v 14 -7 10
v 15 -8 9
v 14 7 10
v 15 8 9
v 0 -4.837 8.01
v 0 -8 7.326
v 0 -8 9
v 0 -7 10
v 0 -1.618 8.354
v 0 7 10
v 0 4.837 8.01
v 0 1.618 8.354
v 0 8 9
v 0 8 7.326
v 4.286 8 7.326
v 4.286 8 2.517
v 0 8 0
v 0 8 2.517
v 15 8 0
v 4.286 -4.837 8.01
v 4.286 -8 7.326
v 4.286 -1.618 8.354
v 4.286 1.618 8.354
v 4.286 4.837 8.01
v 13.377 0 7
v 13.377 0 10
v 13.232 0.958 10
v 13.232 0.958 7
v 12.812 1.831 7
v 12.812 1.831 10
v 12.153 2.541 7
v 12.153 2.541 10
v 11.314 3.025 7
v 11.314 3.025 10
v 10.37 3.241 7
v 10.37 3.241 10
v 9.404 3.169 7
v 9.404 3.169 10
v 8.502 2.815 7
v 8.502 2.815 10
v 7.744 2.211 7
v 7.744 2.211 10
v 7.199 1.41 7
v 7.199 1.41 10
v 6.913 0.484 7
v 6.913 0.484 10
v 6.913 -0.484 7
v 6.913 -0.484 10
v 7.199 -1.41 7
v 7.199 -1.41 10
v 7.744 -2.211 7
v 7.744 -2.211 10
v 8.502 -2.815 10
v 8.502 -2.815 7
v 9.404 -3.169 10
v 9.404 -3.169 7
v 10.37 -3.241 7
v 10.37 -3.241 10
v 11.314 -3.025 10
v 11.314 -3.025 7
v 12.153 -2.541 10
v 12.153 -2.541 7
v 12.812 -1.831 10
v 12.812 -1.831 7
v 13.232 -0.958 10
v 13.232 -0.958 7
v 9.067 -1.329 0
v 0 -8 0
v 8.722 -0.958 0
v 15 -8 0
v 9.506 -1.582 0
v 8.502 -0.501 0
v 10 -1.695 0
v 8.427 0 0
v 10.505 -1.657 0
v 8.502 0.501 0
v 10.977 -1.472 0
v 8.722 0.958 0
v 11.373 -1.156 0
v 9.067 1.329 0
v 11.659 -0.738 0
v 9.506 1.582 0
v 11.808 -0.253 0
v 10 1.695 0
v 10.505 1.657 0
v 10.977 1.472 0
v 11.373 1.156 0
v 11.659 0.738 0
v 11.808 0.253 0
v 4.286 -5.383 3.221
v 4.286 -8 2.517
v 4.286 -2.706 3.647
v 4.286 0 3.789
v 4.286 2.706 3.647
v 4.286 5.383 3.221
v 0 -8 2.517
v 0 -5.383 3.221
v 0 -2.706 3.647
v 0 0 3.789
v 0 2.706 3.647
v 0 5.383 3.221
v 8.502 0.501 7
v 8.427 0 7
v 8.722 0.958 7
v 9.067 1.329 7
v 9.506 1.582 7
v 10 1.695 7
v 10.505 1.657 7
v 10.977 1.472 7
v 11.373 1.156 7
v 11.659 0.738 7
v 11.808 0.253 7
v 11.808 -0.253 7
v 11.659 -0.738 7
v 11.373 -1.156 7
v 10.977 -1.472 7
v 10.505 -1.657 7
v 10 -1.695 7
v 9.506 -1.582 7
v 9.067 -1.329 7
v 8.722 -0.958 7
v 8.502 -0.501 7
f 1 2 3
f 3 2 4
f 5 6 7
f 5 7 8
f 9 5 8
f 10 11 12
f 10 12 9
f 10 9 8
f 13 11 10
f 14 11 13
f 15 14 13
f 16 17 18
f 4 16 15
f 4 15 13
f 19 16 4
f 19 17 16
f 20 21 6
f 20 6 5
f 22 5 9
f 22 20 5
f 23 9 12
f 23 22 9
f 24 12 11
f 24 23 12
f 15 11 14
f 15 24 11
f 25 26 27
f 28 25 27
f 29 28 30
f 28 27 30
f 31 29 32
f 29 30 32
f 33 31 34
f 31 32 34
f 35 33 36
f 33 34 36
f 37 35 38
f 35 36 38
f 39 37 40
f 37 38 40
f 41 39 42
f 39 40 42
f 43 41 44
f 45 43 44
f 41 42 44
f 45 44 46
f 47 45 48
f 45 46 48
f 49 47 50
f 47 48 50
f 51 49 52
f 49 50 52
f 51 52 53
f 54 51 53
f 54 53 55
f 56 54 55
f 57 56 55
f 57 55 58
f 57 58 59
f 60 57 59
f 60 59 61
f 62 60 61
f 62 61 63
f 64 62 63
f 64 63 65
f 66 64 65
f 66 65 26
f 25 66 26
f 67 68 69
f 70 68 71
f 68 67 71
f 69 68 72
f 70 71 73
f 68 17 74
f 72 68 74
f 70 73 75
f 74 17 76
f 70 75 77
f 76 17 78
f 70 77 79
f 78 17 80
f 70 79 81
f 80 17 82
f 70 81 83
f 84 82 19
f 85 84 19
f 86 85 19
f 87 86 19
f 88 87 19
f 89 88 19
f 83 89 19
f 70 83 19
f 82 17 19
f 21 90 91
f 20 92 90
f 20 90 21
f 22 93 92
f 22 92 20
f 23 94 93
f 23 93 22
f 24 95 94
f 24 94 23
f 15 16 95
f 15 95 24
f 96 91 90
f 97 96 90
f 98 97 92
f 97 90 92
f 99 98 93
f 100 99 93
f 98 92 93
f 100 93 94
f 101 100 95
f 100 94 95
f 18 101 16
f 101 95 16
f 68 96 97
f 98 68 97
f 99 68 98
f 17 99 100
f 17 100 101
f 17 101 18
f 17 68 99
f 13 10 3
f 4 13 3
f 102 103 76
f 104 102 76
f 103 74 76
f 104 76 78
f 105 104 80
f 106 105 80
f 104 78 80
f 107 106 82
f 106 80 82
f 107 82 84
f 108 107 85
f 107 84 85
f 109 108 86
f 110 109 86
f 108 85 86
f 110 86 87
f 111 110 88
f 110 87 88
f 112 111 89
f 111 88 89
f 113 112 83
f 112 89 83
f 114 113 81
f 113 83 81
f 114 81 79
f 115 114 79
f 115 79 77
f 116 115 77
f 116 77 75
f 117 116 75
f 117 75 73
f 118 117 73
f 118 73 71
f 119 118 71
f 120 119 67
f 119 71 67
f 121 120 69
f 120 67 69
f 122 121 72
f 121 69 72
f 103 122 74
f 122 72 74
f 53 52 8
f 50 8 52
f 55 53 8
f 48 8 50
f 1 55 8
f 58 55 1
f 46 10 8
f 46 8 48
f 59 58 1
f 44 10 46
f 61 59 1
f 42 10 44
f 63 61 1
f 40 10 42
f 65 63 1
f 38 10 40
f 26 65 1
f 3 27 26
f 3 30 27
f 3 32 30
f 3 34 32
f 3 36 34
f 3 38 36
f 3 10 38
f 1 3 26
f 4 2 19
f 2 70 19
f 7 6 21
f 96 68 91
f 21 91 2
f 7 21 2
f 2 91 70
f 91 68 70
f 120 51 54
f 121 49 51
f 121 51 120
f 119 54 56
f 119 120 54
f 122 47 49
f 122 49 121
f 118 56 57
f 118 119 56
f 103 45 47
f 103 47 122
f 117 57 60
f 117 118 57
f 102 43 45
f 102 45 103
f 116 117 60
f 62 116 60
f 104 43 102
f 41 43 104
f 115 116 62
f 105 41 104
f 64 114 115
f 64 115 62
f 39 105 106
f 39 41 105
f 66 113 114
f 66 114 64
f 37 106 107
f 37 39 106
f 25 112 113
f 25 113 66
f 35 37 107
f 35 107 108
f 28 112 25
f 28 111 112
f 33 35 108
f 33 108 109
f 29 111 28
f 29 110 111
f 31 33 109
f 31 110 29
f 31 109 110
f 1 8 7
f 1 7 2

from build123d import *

# Parameters (mm, degrees)
ESQUISSE1_W                                        = 15
ESQUISSE1_H                                        = 16
EXTRUSION1_DEPTH                                   = 10
CHANFREIN1_SIZE                                    = 1
CHAMBRAGE_POUR_VIS_T_TE_HEXAGONALE_M31_D           = 3.4
CHAMBRAGE_POUR_VIS_T_TE_HEXAGONALE_M31_CBORE_D     = 6.5
CHAMBRAGE_POUR_VIS_T_TE_HEXAGONALE_M31_CBORE_DEPTH = 3
ESQUISSE2_W                                        = 5.5288305
ESQUISSE2_H                                        = 4.608549318
ENL_VEMENT_DE_MATI_RE_R_VOLUTION1_ANGLE            = 39
CHANFREIN2_SIZE                                    = 1


with BuildPart() as part:
    # Esquisse1 → Extrusion1 (new body)
    with BuildSketch(Plane.XY):
        with Locations((7.5, 0)):
            Rectangle(ESQUISSE1_W, ESQUISSE1_H)
    extrude(amount=EXTRUSION1_DEPTH)

    # Chanfrein1
    chanfrein1_edges = [part.edges().sort_by_distance(p)[0] for p in [
        (7.5, 8, 10),
        (7.5, -8, 10),
    ]]
    chamfer(chanfrein1_edges, length=CHANFREIN1_SIZE)

    # Chambrage pour vis à tête hexagonale M31 (through all)
    with Locations(Plane(origin=(10.126877496, 0, 10), x_dir=(1, 0, 0), z_dir=(0, 0, 1))):
        with Locations((0, 0)):
            CounterBoreHole(CHAMBRAGE_POUR_VIS_T_TE_HEXAGONALE_M31_D / 2, CHAMBRAGE_POUR_VIS_T_TE_HEXAGONALE_M31_CBORE_D / 2, CHAMBRAGE_POUR_VIS_T_TE_HEXAGONALE_M31_CBORE_DEPTH)

    # Esquisse2 → Enlèvement de matière-Révolution1 (revolve, symmetric, cut)
    with BuildSketch(Plane(origin=(0, 0, 0), x_dir=(1, 0, 0), z_dir=(0, 1, 0))) as enl_vement_de_mati_re_r_volution1_sk:
        with Locations((1.521286307, -6.093228571)):
            Rectangle(ESQUISSE2_W, ESQUISSE2_H)
    revolve(axis=Axis((6.580325396, 0, -22), (1, 0, 0)), revolution_arc=ENL_VEMENT_DE_MATI_RE_R_VOLUTION1_ANGLE / 2, mode=Mode.SUBTRACT)
    revolve(enl_vement_de_mati_re_r_volution1_sk.sketch, axis=Axis((6.580325396, 0, -22), (-1, 0, 0)), revolution_arc=ENL_VEMENT_DE_MATI_RE_R_VOLUTION1_ANGLE / 2, mode=Mode.SUBTRACT)

    # Chanfrein2
    chanfrein2_edges = [part.edges().sort_by_distance(p)[0] for p in [
        (15, 0, 10),
    ]]
    chamfer(chanfrein2_edges, length=CHANFREIN2_SIZE)


solid = part.part
